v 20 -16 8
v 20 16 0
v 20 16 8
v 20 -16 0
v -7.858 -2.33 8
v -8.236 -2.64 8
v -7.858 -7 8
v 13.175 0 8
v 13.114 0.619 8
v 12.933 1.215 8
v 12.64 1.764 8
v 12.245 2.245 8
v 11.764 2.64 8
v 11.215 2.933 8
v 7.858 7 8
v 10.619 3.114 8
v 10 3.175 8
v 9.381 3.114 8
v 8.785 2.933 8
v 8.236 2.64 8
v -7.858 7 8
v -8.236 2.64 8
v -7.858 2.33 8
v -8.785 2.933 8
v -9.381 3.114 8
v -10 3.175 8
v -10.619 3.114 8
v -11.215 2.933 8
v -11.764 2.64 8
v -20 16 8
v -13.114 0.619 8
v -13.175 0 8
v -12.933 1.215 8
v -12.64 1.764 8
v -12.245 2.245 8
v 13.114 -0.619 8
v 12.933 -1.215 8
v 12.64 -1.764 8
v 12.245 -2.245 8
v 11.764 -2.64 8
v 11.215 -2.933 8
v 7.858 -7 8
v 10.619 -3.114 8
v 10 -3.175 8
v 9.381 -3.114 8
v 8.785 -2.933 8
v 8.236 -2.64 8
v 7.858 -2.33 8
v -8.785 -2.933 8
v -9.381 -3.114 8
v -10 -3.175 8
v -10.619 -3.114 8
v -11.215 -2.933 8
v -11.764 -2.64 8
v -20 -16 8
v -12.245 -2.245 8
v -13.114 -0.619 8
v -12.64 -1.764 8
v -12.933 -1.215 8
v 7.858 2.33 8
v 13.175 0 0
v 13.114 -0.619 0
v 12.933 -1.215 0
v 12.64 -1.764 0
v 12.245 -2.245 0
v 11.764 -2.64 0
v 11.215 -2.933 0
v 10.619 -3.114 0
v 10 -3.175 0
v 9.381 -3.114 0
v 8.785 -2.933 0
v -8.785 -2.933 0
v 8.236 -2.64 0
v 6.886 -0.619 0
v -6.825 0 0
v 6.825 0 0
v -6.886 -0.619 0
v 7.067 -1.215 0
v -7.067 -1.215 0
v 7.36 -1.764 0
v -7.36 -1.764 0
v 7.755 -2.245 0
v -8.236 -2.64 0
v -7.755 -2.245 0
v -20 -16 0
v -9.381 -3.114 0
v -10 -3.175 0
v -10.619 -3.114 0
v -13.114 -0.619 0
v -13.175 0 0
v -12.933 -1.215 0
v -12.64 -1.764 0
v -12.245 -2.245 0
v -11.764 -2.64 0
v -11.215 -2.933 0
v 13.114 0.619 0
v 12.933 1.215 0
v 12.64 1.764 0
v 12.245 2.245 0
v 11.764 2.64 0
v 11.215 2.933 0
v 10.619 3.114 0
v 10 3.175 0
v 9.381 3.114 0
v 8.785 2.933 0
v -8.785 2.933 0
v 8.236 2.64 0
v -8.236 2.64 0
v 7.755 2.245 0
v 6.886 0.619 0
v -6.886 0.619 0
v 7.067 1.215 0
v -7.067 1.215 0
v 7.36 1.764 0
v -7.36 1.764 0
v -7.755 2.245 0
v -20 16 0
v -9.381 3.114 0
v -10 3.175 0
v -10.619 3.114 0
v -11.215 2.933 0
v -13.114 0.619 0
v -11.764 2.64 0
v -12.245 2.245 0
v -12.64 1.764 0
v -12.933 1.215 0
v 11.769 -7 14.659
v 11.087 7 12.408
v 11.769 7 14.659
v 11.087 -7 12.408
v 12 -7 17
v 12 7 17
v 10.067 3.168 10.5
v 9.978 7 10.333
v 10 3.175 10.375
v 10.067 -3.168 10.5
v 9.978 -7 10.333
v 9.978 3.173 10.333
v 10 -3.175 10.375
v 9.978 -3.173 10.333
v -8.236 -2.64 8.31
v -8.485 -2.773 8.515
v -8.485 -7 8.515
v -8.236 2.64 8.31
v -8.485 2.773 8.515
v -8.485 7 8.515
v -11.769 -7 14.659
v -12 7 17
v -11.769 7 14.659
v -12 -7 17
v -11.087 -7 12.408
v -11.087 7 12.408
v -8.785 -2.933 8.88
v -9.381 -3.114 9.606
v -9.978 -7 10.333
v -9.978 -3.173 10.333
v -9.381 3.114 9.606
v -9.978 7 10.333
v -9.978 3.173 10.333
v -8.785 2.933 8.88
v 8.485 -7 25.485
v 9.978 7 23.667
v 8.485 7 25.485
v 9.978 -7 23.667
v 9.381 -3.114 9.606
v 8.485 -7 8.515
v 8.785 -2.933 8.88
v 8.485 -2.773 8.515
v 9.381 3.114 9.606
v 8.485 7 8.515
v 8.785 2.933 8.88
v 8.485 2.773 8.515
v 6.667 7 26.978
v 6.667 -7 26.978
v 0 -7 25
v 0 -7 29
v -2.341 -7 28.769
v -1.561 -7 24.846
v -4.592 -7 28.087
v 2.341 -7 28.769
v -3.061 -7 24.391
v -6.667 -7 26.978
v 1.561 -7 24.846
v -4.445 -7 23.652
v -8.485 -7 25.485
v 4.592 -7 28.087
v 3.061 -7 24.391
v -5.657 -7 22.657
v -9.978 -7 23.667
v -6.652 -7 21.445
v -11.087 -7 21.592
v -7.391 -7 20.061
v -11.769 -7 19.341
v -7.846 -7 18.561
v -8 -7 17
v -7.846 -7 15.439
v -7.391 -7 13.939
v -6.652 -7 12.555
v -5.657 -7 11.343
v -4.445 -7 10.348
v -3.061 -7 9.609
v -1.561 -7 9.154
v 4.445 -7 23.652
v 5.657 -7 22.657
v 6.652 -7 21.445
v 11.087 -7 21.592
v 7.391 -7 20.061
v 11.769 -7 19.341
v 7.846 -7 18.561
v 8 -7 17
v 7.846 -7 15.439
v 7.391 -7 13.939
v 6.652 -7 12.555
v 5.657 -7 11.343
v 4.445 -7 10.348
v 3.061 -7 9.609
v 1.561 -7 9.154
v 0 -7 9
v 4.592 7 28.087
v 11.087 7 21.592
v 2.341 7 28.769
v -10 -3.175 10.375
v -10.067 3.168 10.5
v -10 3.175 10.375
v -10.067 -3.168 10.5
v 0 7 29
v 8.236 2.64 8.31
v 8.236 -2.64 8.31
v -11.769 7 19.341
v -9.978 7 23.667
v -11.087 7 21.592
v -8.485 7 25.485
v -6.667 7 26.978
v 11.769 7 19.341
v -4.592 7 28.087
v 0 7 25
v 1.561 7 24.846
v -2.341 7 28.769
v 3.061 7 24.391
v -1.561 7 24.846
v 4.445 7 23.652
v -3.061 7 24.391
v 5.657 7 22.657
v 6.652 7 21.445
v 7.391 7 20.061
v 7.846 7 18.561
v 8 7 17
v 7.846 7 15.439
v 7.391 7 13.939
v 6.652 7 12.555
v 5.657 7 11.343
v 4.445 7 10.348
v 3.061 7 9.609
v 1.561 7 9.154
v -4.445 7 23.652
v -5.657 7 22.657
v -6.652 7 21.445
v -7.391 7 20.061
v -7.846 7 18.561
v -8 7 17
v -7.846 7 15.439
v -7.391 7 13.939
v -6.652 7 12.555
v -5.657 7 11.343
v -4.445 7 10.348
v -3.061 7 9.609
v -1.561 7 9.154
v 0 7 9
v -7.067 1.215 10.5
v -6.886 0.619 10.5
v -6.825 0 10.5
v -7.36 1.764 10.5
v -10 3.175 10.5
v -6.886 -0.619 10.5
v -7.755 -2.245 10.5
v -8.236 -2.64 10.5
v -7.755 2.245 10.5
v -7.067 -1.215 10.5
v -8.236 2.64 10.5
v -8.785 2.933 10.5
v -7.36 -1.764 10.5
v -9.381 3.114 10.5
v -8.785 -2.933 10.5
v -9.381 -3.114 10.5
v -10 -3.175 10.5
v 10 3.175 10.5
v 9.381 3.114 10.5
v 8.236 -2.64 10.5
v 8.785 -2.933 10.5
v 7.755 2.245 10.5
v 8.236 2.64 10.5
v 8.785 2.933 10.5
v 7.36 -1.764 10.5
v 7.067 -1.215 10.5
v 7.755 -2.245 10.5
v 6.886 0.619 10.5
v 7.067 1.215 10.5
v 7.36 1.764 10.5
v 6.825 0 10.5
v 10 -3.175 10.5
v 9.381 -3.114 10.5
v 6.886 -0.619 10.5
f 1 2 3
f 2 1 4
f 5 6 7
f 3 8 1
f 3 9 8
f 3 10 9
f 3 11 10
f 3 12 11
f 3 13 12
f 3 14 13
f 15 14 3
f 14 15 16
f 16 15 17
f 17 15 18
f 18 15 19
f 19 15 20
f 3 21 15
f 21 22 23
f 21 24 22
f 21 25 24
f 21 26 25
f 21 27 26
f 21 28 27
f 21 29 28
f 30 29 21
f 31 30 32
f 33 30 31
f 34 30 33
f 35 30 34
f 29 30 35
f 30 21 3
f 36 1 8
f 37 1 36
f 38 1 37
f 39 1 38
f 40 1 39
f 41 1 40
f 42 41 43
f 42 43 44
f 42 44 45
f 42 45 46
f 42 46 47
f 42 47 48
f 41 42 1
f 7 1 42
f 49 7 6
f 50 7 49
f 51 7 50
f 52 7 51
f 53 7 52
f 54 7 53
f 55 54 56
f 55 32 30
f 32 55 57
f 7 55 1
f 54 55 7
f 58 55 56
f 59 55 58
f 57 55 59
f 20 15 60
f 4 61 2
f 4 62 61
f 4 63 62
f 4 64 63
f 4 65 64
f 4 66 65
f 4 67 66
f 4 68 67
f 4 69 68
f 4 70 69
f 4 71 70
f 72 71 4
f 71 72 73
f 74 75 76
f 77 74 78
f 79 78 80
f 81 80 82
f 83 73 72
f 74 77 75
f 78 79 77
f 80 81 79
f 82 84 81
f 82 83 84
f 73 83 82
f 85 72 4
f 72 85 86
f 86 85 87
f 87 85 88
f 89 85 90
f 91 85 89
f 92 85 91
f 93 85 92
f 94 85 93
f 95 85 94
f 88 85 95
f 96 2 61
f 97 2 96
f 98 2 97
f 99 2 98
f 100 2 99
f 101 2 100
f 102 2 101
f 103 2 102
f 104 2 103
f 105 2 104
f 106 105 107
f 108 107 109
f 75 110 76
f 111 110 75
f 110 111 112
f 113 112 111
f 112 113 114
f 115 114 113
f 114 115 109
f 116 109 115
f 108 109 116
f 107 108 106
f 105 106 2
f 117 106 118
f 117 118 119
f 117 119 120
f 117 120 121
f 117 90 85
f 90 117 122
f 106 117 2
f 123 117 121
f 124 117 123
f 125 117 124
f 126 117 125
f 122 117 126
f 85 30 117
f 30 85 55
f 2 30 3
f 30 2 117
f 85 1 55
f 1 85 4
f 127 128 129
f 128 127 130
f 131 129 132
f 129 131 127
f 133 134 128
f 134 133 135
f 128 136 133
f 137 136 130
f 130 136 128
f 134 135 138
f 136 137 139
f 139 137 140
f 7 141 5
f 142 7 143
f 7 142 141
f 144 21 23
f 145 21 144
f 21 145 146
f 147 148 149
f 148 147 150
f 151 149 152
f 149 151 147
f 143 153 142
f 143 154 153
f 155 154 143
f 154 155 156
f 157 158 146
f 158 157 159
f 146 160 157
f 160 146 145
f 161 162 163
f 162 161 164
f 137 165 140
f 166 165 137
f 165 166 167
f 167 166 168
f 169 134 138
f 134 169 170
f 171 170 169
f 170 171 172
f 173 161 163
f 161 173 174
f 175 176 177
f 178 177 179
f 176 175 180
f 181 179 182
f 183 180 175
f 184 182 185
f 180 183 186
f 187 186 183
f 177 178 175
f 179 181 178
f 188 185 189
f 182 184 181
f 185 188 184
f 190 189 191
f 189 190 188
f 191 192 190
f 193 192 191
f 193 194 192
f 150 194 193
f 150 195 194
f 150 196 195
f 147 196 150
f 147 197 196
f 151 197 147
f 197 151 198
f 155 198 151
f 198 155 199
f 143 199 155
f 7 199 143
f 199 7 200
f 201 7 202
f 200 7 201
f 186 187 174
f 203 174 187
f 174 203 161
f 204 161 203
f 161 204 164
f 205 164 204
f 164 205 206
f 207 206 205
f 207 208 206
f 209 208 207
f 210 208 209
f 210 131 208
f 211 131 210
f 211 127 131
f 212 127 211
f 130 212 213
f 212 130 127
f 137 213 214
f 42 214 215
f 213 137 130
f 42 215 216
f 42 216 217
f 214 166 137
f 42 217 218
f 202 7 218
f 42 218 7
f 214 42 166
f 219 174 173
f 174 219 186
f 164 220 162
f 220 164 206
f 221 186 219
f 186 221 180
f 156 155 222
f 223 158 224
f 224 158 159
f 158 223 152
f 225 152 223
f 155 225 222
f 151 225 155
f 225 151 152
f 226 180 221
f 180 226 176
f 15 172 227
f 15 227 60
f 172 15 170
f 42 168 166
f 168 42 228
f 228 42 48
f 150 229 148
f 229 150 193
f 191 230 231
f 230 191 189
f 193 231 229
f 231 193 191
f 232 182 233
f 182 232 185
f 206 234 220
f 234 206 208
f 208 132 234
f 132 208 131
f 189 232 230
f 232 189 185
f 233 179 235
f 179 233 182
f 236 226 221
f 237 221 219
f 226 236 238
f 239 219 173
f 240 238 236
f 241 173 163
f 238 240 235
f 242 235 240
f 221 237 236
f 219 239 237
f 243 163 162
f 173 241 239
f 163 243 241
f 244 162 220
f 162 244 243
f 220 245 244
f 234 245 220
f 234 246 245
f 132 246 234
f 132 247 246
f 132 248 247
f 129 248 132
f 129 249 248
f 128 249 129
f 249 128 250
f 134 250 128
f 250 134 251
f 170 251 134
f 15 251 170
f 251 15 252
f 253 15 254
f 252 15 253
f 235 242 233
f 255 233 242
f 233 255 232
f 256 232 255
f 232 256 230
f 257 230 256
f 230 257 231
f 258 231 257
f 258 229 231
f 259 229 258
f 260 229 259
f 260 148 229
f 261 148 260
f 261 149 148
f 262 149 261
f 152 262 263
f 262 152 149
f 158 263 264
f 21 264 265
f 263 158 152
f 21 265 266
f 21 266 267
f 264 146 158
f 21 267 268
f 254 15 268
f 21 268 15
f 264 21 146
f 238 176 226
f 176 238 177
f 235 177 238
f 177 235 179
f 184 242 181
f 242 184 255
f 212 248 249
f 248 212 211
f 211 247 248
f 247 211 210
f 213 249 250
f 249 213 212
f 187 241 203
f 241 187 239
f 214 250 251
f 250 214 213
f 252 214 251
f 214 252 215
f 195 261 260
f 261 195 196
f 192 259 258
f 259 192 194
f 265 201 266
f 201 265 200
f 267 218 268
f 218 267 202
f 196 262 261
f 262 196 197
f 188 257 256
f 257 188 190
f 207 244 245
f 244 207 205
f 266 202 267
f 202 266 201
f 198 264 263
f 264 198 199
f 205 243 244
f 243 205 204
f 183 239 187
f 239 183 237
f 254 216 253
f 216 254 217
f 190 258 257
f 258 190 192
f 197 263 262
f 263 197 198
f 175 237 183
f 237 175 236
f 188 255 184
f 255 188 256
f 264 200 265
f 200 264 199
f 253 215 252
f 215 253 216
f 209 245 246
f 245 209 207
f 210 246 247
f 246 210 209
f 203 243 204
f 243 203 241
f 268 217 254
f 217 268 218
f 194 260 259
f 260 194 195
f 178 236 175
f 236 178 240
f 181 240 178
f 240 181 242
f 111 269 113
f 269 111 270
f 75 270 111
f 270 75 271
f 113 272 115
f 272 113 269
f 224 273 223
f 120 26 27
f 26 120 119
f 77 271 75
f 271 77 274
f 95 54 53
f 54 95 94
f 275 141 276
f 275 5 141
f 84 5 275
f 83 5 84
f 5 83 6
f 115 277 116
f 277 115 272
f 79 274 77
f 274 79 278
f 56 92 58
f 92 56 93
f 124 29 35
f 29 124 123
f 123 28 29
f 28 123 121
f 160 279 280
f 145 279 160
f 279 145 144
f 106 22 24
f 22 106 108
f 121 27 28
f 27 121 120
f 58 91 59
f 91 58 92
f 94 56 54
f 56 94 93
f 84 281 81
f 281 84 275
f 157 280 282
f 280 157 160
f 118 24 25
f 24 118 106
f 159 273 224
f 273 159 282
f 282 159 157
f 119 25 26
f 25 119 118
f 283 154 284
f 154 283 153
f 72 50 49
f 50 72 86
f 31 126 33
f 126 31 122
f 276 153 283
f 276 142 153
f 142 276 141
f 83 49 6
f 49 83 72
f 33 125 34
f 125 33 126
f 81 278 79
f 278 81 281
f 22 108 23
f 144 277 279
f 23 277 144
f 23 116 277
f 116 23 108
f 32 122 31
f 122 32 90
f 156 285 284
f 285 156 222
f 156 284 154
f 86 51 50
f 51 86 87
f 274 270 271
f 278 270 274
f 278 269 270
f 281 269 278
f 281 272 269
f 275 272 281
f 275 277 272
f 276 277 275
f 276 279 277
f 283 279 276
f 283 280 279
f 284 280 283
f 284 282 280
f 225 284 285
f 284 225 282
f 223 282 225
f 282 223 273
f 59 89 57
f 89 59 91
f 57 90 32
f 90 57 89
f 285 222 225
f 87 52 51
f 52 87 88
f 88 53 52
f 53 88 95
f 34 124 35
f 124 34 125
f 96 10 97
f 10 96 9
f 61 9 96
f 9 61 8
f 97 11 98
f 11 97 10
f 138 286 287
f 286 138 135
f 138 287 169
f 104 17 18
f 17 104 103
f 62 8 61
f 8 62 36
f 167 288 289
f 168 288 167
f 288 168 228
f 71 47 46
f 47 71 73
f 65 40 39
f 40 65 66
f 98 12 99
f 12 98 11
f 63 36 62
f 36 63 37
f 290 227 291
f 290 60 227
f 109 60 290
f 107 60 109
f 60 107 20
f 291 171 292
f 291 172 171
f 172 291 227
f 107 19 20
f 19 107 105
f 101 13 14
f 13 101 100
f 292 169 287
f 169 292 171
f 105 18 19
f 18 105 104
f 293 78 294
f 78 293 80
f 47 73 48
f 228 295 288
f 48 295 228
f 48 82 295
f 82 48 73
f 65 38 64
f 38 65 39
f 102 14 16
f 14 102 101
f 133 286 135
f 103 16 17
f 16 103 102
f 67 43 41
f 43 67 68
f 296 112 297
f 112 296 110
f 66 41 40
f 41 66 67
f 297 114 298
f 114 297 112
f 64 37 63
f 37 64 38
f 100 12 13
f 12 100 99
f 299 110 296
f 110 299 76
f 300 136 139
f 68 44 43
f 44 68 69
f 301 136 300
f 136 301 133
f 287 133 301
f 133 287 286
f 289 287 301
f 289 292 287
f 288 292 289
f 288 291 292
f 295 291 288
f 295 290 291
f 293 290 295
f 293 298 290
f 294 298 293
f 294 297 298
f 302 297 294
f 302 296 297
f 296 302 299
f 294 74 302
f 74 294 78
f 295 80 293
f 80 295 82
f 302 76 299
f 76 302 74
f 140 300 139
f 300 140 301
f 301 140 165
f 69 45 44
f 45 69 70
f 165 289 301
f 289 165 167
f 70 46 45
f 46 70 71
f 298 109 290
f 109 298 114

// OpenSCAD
$fn = 32;

// ----------------------------------------------------------------------
// Deck eye: 24 mm eye on a 40 mm base
// ----------------------------------------------------------------------

// --- parameters (mm) ---
base_l = 40;              // base length
base_w = 32;              // base width
base_t = 8;               // base thickness
eye_r = 12;               // eye outside radius
eye_bore = 16;            // eye bore diameter
eye_w = 14;               // eye thickness
eye_z = 17;               // eye centre height
holes_d = 6.35;           // fixing holes
hole_x = 10;              // fixing hole spacing

difference() {
  union() {
    translate([-20, -16, 0]) cube([base_l, base_w, base_t]);
    /* eye standing upright, its foot sunk 3 mm into the base */
    translate([0, -7, 17]) rotate([-90, 0, 0]) cylinder(h = 14, d = 24);
  }
  /* eye bore, 2.5 mm clear of both faces */
  translate([0, -9.5, 17]) rotate([-90, 0, 0]) cylinder(h = 19, d = 16);
  translate([-10, 0, -2.5]) cylinder(h = base_t + 5, d = holes_d);
  translate([10, 0, -2.5]) cylinder(h = base_t + 5, d = holes_d);
}
